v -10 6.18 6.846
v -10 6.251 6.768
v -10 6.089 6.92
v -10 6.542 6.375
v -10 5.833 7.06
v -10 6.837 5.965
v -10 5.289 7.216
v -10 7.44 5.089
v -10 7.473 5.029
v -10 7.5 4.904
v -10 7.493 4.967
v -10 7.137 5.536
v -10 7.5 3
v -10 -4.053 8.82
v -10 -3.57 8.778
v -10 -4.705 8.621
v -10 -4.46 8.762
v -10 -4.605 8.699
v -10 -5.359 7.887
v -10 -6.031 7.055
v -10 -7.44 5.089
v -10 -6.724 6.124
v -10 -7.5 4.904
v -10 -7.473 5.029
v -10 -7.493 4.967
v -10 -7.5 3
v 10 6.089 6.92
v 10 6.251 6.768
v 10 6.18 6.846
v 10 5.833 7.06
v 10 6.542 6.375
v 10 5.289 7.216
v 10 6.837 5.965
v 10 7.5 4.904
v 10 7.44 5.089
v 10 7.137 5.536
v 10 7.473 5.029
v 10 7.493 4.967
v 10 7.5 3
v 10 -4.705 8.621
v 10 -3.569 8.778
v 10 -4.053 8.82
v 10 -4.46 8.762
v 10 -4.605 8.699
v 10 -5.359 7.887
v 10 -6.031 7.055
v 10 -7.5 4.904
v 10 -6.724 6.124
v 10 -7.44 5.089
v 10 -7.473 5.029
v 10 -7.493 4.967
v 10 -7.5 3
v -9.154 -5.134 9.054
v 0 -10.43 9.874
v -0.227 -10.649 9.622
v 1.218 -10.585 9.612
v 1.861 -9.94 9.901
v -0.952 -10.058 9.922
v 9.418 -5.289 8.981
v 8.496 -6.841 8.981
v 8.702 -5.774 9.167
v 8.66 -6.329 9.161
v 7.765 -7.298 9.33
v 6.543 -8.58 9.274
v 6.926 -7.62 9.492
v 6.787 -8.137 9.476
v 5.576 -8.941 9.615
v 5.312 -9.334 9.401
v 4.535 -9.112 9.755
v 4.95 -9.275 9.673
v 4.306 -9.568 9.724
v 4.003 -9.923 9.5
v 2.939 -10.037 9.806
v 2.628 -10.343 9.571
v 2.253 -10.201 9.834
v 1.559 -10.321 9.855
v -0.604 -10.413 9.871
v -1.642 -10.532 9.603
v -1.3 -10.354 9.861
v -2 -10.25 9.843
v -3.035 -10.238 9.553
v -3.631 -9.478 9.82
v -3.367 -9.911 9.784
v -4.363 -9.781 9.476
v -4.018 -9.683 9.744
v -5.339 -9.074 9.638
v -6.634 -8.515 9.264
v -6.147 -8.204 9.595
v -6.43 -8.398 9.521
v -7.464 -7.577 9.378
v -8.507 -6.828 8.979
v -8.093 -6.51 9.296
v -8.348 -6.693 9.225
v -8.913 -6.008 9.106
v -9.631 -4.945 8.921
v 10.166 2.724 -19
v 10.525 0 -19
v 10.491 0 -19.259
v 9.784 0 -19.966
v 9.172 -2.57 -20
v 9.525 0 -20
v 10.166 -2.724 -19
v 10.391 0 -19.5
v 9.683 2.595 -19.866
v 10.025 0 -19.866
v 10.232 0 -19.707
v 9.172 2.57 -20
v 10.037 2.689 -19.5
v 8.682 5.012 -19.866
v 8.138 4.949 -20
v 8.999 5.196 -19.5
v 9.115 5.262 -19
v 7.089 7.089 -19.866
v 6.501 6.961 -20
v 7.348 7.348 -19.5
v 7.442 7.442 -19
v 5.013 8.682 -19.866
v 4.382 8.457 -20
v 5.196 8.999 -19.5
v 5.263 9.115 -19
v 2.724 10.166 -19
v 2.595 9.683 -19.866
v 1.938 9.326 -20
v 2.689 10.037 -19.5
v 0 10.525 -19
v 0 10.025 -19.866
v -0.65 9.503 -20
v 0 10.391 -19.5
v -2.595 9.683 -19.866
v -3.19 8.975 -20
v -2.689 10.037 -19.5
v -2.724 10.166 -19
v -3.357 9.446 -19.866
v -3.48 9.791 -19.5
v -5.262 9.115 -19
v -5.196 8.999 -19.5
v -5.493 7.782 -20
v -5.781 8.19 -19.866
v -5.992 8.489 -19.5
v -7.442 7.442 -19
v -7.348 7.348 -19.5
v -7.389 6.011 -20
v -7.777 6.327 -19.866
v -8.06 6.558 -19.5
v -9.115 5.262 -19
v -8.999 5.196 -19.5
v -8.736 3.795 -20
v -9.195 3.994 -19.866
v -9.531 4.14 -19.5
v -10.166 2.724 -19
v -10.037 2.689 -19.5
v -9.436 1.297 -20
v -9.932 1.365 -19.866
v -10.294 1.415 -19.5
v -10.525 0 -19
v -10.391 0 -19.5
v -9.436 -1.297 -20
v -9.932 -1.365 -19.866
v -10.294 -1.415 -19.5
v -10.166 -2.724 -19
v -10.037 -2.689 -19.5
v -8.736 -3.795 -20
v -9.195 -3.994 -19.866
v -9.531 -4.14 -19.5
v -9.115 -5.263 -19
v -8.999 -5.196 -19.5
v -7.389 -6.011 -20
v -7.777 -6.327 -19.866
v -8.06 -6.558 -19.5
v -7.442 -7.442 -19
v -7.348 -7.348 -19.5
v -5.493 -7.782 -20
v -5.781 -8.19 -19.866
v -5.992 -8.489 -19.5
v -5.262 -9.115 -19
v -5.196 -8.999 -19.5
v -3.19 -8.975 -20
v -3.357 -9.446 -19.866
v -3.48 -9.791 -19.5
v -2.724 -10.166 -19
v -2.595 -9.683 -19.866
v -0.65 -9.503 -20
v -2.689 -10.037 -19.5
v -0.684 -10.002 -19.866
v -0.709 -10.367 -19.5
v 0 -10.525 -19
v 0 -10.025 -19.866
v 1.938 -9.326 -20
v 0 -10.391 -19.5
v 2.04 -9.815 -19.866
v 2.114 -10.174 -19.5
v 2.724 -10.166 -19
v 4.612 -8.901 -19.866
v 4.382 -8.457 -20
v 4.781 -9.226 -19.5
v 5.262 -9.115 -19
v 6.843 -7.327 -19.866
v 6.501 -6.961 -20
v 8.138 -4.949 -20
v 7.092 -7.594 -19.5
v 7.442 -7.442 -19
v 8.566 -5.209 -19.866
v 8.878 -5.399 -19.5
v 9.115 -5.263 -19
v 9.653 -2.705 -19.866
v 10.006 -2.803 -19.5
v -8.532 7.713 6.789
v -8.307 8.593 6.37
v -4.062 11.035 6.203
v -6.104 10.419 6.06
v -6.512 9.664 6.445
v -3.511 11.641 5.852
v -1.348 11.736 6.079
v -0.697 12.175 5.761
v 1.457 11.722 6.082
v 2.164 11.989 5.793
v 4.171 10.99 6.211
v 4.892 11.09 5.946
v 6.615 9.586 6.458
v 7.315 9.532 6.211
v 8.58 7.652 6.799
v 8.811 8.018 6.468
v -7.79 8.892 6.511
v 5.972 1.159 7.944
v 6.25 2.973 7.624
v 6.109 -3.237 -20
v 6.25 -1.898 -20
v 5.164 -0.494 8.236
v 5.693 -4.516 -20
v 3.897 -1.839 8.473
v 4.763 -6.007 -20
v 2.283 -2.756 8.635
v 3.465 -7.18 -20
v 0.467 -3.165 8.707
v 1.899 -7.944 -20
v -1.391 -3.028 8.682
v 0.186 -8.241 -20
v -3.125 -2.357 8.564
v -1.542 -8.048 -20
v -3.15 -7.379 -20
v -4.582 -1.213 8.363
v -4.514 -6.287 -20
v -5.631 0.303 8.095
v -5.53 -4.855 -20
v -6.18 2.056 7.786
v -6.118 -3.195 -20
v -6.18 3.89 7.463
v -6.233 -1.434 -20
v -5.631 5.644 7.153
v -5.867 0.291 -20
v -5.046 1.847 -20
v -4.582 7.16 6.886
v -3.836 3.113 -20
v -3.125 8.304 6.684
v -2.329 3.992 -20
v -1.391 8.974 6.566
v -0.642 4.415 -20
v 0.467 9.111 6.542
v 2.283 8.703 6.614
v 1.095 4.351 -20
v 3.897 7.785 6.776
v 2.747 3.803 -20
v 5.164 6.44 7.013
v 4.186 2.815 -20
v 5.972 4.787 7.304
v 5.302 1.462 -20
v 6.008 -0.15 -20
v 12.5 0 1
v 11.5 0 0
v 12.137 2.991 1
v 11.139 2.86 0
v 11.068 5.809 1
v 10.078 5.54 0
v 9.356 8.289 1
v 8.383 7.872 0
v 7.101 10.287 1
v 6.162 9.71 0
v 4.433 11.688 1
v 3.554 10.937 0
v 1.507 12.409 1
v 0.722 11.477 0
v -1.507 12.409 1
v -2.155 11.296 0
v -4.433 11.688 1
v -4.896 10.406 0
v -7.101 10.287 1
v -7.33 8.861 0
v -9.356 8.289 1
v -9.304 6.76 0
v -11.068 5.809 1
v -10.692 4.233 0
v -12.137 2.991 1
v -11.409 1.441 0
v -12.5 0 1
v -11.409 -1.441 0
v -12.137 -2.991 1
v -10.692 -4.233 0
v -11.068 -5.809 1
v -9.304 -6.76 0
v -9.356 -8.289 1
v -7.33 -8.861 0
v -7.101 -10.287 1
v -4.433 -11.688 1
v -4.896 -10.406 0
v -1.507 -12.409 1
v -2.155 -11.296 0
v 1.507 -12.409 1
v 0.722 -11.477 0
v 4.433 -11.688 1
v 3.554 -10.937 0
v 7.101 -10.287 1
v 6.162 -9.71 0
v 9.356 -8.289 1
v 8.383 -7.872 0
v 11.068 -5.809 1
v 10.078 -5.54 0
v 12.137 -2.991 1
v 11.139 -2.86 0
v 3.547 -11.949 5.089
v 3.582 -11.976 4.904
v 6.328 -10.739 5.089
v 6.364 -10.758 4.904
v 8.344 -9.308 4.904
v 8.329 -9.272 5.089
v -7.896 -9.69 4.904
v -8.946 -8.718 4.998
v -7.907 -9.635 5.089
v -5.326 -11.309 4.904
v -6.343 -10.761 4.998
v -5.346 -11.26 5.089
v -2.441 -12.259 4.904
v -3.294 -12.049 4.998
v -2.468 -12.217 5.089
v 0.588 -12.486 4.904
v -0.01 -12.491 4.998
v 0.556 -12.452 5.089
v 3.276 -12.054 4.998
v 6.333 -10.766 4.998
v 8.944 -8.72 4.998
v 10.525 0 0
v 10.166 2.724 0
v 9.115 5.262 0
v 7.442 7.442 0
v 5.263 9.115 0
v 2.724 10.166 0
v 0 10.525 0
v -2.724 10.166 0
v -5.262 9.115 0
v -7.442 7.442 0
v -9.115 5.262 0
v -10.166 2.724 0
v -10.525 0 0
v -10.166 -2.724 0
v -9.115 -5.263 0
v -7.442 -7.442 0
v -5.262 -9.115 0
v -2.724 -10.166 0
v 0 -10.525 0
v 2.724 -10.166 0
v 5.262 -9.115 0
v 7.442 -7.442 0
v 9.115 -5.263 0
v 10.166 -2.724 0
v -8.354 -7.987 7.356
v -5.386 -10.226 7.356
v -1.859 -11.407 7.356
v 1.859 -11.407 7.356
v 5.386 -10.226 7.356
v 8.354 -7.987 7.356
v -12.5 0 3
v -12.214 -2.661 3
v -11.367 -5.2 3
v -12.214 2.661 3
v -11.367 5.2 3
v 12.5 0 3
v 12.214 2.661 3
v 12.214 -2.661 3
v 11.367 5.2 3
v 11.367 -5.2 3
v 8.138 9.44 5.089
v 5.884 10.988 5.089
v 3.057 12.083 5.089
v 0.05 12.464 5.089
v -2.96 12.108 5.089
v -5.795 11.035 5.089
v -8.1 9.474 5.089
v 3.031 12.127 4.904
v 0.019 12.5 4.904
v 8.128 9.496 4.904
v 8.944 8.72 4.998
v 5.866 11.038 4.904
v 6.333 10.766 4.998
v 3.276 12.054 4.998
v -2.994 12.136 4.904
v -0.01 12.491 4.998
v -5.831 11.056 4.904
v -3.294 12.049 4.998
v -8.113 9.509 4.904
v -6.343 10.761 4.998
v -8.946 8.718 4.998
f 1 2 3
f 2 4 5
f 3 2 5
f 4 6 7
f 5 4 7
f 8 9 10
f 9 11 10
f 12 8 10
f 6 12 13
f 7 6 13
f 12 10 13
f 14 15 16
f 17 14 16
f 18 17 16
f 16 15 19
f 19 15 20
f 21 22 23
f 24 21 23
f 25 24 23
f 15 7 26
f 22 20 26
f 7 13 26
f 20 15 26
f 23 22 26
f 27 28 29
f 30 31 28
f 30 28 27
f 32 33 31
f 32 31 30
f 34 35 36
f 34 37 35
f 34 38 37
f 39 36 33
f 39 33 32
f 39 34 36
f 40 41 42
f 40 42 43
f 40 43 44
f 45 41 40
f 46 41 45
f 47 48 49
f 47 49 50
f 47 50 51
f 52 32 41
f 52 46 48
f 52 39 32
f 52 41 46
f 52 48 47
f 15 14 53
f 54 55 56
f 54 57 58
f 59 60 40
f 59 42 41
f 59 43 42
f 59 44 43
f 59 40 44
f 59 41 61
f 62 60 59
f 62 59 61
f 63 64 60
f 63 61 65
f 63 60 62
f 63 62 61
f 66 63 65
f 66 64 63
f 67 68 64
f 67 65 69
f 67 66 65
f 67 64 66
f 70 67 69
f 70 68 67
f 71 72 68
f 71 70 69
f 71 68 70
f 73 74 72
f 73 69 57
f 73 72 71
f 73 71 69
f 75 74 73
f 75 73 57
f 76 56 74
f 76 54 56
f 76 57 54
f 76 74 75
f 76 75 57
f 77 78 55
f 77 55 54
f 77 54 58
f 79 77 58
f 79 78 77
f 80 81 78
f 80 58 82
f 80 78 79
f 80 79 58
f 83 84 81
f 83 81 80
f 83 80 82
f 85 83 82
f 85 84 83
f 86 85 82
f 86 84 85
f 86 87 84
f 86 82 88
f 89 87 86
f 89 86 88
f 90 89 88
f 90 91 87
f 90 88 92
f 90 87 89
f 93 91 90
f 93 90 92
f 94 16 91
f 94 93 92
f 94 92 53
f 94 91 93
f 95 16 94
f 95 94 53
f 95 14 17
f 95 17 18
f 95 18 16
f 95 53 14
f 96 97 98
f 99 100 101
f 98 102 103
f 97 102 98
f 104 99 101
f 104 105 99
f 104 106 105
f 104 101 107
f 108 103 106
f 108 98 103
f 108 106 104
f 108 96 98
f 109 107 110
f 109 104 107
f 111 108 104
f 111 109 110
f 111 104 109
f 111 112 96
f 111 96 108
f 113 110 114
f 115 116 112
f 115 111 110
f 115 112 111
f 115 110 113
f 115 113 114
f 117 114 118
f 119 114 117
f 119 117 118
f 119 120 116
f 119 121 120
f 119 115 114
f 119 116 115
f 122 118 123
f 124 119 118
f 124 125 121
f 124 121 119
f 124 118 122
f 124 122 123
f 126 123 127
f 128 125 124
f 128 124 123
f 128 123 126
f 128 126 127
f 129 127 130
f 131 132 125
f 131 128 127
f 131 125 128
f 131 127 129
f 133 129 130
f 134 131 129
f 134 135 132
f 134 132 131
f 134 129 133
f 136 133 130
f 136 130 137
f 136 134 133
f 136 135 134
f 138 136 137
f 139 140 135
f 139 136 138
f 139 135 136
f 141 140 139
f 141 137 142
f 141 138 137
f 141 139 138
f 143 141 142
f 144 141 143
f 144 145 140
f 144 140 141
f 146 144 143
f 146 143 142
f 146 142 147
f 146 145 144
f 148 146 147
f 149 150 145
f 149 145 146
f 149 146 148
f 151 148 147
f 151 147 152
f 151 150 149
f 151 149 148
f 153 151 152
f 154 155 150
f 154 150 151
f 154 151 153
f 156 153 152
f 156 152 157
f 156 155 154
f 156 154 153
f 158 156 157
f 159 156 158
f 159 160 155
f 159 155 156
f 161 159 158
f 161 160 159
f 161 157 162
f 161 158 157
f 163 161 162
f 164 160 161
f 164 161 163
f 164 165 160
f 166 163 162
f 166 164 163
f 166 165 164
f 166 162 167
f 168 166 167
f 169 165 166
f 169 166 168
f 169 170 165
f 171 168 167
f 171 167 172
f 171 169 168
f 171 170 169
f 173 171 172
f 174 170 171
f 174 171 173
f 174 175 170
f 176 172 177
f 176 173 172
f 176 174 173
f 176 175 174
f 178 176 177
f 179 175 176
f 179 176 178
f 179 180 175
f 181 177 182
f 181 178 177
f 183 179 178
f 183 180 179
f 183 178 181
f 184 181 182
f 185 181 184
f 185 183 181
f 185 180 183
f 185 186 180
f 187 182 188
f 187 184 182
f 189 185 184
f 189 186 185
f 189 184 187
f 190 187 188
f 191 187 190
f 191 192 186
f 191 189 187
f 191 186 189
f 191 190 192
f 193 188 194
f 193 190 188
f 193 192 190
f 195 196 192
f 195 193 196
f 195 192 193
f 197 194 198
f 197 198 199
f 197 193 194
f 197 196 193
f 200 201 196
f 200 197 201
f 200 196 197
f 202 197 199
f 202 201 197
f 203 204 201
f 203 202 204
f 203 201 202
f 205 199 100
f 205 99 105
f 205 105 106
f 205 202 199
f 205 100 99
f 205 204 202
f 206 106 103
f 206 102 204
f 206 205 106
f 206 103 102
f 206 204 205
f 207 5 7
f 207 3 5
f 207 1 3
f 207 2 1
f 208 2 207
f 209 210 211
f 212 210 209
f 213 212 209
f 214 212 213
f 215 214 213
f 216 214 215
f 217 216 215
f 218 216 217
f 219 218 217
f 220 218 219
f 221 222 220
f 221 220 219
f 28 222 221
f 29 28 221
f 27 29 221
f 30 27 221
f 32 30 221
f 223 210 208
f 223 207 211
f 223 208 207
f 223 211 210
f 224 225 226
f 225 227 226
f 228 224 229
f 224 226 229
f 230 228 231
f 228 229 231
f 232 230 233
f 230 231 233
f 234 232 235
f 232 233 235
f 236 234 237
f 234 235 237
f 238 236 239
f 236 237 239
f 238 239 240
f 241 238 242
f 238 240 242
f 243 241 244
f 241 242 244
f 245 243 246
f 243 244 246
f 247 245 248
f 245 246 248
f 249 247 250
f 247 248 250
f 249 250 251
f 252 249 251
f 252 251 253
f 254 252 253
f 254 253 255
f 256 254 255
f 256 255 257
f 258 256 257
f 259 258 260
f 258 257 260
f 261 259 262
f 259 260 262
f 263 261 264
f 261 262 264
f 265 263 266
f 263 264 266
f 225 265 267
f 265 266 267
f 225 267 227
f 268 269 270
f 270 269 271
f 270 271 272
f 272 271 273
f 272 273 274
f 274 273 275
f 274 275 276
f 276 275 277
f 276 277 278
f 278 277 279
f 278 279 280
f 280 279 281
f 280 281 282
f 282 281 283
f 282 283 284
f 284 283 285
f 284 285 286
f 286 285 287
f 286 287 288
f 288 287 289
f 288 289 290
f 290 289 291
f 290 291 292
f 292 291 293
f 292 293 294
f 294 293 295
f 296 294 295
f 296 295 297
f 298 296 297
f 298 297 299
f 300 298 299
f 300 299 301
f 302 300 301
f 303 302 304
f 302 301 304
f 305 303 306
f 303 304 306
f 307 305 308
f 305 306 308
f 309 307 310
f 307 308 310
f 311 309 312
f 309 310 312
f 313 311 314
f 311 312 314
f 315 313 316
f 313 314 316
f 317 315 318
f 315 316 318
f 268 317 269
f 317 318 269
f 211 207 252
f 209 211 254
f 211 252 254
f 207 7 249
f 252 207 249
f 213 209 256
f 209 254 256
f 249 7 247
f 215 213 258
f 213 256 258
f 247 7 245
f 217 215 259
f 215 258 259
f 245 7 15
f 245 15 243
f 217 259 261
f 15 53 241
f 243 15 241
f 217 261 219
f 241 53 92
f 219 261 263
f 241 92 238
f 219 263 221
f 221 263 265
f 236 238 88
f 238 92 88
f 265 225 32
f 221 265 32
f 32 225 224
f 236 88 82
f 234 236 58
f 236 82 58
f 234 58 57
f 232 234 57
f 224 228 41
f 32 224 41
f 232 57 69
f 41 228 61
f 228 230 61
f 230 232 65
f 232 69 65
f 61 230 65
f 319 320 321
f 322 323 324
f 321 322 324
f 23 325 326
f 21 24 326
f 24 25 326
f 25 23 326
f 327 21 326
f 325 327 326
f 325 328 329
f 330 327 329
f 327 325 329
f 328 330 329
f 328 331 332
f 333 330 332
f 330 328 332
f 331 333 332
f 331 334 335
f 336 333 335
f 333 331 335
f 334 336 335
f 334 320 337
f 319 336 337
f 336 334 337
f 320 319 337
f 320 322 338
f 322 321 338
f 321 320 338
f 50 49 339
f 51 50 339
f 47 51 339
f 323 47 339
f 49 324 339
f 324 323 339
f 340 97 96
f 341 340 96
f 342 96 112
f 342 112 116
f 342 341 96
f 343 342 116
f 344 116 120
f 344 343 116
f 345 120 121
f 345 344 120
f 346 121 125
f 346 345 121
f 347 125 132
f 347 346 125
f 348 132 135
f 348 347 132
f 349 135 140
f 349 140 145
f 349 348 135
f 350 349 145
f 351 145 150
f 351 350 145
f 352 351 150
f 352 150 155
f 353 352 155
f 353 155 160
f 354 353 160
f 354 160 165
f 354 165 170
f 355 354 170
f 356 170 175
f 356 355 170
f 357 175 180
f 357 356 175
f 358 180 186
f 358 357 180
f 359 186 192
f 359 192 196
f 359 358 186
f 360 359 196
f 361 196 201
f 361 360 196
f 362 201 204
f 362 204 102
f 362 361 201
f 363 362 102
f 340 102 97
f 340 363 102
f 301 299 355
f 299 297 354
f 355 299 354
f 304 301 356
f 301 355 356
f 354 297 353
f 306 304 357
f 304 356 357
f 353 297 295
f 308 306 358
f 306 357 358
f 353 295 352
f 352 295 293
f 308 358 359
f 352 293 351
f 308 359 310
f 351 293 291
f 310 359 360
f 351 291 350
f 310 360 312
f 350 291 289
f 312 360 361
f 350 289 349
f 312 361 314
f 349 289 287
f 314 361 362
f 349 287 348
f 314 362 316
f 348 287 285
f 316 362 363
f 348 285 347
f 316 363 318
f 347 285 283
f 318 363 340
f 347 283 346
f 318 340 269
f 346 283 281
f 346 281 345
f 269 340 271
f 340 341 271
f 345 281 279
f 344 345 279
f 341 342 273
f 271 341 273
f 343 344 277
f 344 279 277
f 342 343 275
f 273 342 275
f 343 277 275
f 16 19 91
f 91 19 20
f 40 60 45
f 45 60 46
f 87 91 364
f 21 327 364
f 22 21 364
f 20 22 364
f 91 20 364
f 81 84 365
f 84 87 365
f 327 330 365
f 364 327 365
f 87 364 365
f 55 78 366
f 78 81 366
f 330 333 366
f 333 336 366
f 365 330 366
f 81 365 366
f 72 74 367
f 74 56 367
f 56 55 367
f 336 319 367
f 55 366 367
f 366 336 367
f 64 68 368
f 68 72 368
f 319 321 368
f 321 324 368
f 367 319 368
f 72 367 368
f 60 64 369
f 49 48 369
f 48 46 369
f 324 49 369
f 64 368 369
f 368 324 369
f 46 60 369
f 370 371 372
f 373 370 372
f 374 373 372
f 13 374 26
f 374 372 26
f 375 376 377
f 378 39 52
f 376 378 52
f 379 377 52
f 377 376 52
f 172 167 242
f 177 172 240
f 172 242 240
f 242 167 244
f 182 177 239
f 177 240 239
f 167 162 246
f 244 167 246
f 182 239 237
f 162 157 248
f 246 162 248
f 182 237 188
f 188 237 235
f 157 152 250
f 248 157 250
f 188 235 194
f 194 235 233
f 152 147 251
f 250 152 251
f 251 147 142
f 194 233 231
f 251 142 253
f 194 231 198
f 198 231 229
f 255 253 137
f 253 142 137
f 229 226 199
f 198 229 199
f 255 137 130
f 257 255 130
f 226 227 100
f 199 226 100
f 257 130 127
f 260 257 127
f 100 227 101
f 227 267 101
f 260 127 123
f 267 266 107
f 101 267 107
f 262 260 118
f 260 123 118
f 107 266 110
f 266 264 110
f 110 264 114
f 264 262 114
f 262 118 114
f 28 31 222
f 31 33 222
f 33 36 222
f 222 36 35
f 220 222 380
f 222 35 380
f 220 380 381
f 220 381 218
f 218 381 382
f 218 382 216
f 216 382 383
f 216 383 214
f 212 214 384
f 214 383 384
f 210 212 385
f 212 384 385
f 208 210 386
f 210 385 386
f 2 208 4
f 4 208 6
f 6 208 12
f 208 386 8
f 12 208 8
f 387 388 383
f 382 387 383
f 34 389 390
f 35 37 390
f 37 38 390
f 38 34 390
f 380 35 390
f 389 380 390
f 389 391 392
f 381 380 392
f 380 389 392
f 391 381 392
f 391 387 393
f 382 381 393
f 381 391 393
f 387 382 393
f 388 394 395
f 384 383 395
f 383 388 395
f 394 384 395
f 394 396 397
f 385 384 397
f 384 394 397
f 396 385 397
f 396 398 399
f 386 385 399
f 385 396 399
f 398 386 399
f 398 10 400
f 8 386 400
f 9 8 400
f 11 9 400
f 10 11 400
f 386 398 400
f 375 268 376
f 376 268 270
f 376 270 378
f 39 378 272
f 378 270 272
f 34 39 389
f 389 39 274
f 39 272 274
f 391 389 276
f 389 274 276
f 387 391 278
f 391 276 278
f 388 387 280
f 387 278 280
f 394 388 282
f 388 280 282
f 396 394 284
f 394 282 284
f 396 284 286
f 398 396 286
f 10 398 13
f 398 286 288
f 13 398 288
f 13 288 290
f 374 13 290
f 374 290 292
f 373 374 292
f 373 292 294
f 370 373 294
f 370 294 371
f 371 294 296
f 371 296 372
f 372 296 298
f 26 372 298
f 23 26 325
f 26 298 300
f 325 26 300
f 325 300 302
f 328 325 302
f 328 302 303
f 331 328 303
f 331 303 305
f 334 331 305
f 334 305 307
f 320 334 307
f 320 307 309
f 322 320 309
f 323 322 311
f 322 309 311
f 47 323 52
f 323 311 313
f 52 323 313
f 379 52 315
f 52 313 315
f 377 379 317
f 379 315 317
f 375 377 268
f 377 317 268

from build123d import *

# Parameters (mm, degrees)
F0_R           = 10.525
F1_DEPTH       = 20
F3_R           = 12.5
F4_DEPTH       = 10
F5_SIZE2       = 5
F5_SIZE        = 2
F8_SIZE        = 1
F9_R           = 0.5
F12_R          = 6.25
F13_DEPTH      = 29.8925289631
F13_DEPTH_BACK = 3.9949082022
F14_W          = 35.6293991208
F14_H          = 33.7468273938
F15_DEPTH      = 3.9949082022
F16_R          = 0.5
F18_W          = 42.0981385947
F18_H          = 52.5076624169
F18_W_2        = 21.5321744272
F18_H_2        = 55.8203060705
F19_DEPTH      = 6.9380379737
F20_R          = 1


with BuildPart() as f1:
    # F0 (on Top) → F1 (new body)
    with BuildSketch(Plane.XY):
        Circle(F0_R)
    extrude(amount=-F1_DEPTH)

    # F3 (on face) → F4 (join)
    with BuildSketch(Plane.XY):
        Circle(F3_R)
    extrude(amount=F4_DEPTH)

    # F5
    f5_edges = [f1.edges().sort_by_distance(p)[0] for p in [
        (-12.5, 0, 10),
    ]]
    f5_side = f1.faces().sort_by_distance((0, 0, 10))[0]
    chamfer(f5_edges, length=F5_SIZE, length2=F5_SIZE2, reference=f5_side)

    # F8
    f8_edges = [f1.edges().sort_by_distance(p)[0] for p in [
        (-12.5, 0, 0),
    ]]
    chamfer(f8_edges, length=F8_SIZE)

    # F9
    f9_edges = [f1.edges().sort_by_distance(p)[0] for p in [
        (-12.5, 0, 5),
    ]]
    fillet(f9_edges, radius=F9_R)

    # F12 (on face) → F13 (cut, two sides)
    with BuildSketch(Plane(origin=(0, 1.3934869758, 7.9028573515), x_dir=(1, 0, 0), z_dir=(0, -0.1736481777, -0.984807753))) as f13_sk:
        with Locations((0, -1.60399963)):
            Circle(F12_R)
    extrude(amount=F13_DEPTH, mode=Mode.SUBTRACT)
    extrude(f13_sk.sketch, amount=-F13_DEPTH_BACK, mode=Mode.SUBTRACT)

    # F14 (on face) → F15 (cut, through all)
    with BuildSketch(Plane(origin=(0, 1.3934869758, 7.9028573515), x_dir=(1, 0, 0), z_dir=(0, -0.1736481777, -0.984807753))):
        with Locations((0.3942959011, 1.4900509268)):
            Rectangle(F14_W, F14_H)
    extrude(amount=-F15_DEPTH, mode=Mode.SUBTRACT)

    # F16
    f16_edges = [f1.edges().sort_by_distance(p)[0] for p in [
        (7.715975, -7.436279, 9.459783),
        (-7.715975, 9.029819, 6.556366),
    ]]
    fillet(f16_edges, radius=F16_R)

    # F18 (on offset) → F19 (cut, through all)
    with BuildSketch(Plane(origin=(0, 0, 3), x_dir=(1, 0, 0), z_dir=(0, 0, -1))):
        with Locations((31.0490692973, 0)):
            Rectangle(F18_W, F18_H)
        with Locations((-20.7660872136, 0)):
            Rectangle(F18_W_2, F18_H_2)
    extrude(amount=-F19_DEPTH, mode=Mode.SUBTRACT)

    # F20
    f20_edges = [f1.edges().sort_by_distance(p)[0] for p in [
        (-10.525, 0, -20),
    ]]
    fillet(f20_edges, radius=F20_R)


solid = f1.part
